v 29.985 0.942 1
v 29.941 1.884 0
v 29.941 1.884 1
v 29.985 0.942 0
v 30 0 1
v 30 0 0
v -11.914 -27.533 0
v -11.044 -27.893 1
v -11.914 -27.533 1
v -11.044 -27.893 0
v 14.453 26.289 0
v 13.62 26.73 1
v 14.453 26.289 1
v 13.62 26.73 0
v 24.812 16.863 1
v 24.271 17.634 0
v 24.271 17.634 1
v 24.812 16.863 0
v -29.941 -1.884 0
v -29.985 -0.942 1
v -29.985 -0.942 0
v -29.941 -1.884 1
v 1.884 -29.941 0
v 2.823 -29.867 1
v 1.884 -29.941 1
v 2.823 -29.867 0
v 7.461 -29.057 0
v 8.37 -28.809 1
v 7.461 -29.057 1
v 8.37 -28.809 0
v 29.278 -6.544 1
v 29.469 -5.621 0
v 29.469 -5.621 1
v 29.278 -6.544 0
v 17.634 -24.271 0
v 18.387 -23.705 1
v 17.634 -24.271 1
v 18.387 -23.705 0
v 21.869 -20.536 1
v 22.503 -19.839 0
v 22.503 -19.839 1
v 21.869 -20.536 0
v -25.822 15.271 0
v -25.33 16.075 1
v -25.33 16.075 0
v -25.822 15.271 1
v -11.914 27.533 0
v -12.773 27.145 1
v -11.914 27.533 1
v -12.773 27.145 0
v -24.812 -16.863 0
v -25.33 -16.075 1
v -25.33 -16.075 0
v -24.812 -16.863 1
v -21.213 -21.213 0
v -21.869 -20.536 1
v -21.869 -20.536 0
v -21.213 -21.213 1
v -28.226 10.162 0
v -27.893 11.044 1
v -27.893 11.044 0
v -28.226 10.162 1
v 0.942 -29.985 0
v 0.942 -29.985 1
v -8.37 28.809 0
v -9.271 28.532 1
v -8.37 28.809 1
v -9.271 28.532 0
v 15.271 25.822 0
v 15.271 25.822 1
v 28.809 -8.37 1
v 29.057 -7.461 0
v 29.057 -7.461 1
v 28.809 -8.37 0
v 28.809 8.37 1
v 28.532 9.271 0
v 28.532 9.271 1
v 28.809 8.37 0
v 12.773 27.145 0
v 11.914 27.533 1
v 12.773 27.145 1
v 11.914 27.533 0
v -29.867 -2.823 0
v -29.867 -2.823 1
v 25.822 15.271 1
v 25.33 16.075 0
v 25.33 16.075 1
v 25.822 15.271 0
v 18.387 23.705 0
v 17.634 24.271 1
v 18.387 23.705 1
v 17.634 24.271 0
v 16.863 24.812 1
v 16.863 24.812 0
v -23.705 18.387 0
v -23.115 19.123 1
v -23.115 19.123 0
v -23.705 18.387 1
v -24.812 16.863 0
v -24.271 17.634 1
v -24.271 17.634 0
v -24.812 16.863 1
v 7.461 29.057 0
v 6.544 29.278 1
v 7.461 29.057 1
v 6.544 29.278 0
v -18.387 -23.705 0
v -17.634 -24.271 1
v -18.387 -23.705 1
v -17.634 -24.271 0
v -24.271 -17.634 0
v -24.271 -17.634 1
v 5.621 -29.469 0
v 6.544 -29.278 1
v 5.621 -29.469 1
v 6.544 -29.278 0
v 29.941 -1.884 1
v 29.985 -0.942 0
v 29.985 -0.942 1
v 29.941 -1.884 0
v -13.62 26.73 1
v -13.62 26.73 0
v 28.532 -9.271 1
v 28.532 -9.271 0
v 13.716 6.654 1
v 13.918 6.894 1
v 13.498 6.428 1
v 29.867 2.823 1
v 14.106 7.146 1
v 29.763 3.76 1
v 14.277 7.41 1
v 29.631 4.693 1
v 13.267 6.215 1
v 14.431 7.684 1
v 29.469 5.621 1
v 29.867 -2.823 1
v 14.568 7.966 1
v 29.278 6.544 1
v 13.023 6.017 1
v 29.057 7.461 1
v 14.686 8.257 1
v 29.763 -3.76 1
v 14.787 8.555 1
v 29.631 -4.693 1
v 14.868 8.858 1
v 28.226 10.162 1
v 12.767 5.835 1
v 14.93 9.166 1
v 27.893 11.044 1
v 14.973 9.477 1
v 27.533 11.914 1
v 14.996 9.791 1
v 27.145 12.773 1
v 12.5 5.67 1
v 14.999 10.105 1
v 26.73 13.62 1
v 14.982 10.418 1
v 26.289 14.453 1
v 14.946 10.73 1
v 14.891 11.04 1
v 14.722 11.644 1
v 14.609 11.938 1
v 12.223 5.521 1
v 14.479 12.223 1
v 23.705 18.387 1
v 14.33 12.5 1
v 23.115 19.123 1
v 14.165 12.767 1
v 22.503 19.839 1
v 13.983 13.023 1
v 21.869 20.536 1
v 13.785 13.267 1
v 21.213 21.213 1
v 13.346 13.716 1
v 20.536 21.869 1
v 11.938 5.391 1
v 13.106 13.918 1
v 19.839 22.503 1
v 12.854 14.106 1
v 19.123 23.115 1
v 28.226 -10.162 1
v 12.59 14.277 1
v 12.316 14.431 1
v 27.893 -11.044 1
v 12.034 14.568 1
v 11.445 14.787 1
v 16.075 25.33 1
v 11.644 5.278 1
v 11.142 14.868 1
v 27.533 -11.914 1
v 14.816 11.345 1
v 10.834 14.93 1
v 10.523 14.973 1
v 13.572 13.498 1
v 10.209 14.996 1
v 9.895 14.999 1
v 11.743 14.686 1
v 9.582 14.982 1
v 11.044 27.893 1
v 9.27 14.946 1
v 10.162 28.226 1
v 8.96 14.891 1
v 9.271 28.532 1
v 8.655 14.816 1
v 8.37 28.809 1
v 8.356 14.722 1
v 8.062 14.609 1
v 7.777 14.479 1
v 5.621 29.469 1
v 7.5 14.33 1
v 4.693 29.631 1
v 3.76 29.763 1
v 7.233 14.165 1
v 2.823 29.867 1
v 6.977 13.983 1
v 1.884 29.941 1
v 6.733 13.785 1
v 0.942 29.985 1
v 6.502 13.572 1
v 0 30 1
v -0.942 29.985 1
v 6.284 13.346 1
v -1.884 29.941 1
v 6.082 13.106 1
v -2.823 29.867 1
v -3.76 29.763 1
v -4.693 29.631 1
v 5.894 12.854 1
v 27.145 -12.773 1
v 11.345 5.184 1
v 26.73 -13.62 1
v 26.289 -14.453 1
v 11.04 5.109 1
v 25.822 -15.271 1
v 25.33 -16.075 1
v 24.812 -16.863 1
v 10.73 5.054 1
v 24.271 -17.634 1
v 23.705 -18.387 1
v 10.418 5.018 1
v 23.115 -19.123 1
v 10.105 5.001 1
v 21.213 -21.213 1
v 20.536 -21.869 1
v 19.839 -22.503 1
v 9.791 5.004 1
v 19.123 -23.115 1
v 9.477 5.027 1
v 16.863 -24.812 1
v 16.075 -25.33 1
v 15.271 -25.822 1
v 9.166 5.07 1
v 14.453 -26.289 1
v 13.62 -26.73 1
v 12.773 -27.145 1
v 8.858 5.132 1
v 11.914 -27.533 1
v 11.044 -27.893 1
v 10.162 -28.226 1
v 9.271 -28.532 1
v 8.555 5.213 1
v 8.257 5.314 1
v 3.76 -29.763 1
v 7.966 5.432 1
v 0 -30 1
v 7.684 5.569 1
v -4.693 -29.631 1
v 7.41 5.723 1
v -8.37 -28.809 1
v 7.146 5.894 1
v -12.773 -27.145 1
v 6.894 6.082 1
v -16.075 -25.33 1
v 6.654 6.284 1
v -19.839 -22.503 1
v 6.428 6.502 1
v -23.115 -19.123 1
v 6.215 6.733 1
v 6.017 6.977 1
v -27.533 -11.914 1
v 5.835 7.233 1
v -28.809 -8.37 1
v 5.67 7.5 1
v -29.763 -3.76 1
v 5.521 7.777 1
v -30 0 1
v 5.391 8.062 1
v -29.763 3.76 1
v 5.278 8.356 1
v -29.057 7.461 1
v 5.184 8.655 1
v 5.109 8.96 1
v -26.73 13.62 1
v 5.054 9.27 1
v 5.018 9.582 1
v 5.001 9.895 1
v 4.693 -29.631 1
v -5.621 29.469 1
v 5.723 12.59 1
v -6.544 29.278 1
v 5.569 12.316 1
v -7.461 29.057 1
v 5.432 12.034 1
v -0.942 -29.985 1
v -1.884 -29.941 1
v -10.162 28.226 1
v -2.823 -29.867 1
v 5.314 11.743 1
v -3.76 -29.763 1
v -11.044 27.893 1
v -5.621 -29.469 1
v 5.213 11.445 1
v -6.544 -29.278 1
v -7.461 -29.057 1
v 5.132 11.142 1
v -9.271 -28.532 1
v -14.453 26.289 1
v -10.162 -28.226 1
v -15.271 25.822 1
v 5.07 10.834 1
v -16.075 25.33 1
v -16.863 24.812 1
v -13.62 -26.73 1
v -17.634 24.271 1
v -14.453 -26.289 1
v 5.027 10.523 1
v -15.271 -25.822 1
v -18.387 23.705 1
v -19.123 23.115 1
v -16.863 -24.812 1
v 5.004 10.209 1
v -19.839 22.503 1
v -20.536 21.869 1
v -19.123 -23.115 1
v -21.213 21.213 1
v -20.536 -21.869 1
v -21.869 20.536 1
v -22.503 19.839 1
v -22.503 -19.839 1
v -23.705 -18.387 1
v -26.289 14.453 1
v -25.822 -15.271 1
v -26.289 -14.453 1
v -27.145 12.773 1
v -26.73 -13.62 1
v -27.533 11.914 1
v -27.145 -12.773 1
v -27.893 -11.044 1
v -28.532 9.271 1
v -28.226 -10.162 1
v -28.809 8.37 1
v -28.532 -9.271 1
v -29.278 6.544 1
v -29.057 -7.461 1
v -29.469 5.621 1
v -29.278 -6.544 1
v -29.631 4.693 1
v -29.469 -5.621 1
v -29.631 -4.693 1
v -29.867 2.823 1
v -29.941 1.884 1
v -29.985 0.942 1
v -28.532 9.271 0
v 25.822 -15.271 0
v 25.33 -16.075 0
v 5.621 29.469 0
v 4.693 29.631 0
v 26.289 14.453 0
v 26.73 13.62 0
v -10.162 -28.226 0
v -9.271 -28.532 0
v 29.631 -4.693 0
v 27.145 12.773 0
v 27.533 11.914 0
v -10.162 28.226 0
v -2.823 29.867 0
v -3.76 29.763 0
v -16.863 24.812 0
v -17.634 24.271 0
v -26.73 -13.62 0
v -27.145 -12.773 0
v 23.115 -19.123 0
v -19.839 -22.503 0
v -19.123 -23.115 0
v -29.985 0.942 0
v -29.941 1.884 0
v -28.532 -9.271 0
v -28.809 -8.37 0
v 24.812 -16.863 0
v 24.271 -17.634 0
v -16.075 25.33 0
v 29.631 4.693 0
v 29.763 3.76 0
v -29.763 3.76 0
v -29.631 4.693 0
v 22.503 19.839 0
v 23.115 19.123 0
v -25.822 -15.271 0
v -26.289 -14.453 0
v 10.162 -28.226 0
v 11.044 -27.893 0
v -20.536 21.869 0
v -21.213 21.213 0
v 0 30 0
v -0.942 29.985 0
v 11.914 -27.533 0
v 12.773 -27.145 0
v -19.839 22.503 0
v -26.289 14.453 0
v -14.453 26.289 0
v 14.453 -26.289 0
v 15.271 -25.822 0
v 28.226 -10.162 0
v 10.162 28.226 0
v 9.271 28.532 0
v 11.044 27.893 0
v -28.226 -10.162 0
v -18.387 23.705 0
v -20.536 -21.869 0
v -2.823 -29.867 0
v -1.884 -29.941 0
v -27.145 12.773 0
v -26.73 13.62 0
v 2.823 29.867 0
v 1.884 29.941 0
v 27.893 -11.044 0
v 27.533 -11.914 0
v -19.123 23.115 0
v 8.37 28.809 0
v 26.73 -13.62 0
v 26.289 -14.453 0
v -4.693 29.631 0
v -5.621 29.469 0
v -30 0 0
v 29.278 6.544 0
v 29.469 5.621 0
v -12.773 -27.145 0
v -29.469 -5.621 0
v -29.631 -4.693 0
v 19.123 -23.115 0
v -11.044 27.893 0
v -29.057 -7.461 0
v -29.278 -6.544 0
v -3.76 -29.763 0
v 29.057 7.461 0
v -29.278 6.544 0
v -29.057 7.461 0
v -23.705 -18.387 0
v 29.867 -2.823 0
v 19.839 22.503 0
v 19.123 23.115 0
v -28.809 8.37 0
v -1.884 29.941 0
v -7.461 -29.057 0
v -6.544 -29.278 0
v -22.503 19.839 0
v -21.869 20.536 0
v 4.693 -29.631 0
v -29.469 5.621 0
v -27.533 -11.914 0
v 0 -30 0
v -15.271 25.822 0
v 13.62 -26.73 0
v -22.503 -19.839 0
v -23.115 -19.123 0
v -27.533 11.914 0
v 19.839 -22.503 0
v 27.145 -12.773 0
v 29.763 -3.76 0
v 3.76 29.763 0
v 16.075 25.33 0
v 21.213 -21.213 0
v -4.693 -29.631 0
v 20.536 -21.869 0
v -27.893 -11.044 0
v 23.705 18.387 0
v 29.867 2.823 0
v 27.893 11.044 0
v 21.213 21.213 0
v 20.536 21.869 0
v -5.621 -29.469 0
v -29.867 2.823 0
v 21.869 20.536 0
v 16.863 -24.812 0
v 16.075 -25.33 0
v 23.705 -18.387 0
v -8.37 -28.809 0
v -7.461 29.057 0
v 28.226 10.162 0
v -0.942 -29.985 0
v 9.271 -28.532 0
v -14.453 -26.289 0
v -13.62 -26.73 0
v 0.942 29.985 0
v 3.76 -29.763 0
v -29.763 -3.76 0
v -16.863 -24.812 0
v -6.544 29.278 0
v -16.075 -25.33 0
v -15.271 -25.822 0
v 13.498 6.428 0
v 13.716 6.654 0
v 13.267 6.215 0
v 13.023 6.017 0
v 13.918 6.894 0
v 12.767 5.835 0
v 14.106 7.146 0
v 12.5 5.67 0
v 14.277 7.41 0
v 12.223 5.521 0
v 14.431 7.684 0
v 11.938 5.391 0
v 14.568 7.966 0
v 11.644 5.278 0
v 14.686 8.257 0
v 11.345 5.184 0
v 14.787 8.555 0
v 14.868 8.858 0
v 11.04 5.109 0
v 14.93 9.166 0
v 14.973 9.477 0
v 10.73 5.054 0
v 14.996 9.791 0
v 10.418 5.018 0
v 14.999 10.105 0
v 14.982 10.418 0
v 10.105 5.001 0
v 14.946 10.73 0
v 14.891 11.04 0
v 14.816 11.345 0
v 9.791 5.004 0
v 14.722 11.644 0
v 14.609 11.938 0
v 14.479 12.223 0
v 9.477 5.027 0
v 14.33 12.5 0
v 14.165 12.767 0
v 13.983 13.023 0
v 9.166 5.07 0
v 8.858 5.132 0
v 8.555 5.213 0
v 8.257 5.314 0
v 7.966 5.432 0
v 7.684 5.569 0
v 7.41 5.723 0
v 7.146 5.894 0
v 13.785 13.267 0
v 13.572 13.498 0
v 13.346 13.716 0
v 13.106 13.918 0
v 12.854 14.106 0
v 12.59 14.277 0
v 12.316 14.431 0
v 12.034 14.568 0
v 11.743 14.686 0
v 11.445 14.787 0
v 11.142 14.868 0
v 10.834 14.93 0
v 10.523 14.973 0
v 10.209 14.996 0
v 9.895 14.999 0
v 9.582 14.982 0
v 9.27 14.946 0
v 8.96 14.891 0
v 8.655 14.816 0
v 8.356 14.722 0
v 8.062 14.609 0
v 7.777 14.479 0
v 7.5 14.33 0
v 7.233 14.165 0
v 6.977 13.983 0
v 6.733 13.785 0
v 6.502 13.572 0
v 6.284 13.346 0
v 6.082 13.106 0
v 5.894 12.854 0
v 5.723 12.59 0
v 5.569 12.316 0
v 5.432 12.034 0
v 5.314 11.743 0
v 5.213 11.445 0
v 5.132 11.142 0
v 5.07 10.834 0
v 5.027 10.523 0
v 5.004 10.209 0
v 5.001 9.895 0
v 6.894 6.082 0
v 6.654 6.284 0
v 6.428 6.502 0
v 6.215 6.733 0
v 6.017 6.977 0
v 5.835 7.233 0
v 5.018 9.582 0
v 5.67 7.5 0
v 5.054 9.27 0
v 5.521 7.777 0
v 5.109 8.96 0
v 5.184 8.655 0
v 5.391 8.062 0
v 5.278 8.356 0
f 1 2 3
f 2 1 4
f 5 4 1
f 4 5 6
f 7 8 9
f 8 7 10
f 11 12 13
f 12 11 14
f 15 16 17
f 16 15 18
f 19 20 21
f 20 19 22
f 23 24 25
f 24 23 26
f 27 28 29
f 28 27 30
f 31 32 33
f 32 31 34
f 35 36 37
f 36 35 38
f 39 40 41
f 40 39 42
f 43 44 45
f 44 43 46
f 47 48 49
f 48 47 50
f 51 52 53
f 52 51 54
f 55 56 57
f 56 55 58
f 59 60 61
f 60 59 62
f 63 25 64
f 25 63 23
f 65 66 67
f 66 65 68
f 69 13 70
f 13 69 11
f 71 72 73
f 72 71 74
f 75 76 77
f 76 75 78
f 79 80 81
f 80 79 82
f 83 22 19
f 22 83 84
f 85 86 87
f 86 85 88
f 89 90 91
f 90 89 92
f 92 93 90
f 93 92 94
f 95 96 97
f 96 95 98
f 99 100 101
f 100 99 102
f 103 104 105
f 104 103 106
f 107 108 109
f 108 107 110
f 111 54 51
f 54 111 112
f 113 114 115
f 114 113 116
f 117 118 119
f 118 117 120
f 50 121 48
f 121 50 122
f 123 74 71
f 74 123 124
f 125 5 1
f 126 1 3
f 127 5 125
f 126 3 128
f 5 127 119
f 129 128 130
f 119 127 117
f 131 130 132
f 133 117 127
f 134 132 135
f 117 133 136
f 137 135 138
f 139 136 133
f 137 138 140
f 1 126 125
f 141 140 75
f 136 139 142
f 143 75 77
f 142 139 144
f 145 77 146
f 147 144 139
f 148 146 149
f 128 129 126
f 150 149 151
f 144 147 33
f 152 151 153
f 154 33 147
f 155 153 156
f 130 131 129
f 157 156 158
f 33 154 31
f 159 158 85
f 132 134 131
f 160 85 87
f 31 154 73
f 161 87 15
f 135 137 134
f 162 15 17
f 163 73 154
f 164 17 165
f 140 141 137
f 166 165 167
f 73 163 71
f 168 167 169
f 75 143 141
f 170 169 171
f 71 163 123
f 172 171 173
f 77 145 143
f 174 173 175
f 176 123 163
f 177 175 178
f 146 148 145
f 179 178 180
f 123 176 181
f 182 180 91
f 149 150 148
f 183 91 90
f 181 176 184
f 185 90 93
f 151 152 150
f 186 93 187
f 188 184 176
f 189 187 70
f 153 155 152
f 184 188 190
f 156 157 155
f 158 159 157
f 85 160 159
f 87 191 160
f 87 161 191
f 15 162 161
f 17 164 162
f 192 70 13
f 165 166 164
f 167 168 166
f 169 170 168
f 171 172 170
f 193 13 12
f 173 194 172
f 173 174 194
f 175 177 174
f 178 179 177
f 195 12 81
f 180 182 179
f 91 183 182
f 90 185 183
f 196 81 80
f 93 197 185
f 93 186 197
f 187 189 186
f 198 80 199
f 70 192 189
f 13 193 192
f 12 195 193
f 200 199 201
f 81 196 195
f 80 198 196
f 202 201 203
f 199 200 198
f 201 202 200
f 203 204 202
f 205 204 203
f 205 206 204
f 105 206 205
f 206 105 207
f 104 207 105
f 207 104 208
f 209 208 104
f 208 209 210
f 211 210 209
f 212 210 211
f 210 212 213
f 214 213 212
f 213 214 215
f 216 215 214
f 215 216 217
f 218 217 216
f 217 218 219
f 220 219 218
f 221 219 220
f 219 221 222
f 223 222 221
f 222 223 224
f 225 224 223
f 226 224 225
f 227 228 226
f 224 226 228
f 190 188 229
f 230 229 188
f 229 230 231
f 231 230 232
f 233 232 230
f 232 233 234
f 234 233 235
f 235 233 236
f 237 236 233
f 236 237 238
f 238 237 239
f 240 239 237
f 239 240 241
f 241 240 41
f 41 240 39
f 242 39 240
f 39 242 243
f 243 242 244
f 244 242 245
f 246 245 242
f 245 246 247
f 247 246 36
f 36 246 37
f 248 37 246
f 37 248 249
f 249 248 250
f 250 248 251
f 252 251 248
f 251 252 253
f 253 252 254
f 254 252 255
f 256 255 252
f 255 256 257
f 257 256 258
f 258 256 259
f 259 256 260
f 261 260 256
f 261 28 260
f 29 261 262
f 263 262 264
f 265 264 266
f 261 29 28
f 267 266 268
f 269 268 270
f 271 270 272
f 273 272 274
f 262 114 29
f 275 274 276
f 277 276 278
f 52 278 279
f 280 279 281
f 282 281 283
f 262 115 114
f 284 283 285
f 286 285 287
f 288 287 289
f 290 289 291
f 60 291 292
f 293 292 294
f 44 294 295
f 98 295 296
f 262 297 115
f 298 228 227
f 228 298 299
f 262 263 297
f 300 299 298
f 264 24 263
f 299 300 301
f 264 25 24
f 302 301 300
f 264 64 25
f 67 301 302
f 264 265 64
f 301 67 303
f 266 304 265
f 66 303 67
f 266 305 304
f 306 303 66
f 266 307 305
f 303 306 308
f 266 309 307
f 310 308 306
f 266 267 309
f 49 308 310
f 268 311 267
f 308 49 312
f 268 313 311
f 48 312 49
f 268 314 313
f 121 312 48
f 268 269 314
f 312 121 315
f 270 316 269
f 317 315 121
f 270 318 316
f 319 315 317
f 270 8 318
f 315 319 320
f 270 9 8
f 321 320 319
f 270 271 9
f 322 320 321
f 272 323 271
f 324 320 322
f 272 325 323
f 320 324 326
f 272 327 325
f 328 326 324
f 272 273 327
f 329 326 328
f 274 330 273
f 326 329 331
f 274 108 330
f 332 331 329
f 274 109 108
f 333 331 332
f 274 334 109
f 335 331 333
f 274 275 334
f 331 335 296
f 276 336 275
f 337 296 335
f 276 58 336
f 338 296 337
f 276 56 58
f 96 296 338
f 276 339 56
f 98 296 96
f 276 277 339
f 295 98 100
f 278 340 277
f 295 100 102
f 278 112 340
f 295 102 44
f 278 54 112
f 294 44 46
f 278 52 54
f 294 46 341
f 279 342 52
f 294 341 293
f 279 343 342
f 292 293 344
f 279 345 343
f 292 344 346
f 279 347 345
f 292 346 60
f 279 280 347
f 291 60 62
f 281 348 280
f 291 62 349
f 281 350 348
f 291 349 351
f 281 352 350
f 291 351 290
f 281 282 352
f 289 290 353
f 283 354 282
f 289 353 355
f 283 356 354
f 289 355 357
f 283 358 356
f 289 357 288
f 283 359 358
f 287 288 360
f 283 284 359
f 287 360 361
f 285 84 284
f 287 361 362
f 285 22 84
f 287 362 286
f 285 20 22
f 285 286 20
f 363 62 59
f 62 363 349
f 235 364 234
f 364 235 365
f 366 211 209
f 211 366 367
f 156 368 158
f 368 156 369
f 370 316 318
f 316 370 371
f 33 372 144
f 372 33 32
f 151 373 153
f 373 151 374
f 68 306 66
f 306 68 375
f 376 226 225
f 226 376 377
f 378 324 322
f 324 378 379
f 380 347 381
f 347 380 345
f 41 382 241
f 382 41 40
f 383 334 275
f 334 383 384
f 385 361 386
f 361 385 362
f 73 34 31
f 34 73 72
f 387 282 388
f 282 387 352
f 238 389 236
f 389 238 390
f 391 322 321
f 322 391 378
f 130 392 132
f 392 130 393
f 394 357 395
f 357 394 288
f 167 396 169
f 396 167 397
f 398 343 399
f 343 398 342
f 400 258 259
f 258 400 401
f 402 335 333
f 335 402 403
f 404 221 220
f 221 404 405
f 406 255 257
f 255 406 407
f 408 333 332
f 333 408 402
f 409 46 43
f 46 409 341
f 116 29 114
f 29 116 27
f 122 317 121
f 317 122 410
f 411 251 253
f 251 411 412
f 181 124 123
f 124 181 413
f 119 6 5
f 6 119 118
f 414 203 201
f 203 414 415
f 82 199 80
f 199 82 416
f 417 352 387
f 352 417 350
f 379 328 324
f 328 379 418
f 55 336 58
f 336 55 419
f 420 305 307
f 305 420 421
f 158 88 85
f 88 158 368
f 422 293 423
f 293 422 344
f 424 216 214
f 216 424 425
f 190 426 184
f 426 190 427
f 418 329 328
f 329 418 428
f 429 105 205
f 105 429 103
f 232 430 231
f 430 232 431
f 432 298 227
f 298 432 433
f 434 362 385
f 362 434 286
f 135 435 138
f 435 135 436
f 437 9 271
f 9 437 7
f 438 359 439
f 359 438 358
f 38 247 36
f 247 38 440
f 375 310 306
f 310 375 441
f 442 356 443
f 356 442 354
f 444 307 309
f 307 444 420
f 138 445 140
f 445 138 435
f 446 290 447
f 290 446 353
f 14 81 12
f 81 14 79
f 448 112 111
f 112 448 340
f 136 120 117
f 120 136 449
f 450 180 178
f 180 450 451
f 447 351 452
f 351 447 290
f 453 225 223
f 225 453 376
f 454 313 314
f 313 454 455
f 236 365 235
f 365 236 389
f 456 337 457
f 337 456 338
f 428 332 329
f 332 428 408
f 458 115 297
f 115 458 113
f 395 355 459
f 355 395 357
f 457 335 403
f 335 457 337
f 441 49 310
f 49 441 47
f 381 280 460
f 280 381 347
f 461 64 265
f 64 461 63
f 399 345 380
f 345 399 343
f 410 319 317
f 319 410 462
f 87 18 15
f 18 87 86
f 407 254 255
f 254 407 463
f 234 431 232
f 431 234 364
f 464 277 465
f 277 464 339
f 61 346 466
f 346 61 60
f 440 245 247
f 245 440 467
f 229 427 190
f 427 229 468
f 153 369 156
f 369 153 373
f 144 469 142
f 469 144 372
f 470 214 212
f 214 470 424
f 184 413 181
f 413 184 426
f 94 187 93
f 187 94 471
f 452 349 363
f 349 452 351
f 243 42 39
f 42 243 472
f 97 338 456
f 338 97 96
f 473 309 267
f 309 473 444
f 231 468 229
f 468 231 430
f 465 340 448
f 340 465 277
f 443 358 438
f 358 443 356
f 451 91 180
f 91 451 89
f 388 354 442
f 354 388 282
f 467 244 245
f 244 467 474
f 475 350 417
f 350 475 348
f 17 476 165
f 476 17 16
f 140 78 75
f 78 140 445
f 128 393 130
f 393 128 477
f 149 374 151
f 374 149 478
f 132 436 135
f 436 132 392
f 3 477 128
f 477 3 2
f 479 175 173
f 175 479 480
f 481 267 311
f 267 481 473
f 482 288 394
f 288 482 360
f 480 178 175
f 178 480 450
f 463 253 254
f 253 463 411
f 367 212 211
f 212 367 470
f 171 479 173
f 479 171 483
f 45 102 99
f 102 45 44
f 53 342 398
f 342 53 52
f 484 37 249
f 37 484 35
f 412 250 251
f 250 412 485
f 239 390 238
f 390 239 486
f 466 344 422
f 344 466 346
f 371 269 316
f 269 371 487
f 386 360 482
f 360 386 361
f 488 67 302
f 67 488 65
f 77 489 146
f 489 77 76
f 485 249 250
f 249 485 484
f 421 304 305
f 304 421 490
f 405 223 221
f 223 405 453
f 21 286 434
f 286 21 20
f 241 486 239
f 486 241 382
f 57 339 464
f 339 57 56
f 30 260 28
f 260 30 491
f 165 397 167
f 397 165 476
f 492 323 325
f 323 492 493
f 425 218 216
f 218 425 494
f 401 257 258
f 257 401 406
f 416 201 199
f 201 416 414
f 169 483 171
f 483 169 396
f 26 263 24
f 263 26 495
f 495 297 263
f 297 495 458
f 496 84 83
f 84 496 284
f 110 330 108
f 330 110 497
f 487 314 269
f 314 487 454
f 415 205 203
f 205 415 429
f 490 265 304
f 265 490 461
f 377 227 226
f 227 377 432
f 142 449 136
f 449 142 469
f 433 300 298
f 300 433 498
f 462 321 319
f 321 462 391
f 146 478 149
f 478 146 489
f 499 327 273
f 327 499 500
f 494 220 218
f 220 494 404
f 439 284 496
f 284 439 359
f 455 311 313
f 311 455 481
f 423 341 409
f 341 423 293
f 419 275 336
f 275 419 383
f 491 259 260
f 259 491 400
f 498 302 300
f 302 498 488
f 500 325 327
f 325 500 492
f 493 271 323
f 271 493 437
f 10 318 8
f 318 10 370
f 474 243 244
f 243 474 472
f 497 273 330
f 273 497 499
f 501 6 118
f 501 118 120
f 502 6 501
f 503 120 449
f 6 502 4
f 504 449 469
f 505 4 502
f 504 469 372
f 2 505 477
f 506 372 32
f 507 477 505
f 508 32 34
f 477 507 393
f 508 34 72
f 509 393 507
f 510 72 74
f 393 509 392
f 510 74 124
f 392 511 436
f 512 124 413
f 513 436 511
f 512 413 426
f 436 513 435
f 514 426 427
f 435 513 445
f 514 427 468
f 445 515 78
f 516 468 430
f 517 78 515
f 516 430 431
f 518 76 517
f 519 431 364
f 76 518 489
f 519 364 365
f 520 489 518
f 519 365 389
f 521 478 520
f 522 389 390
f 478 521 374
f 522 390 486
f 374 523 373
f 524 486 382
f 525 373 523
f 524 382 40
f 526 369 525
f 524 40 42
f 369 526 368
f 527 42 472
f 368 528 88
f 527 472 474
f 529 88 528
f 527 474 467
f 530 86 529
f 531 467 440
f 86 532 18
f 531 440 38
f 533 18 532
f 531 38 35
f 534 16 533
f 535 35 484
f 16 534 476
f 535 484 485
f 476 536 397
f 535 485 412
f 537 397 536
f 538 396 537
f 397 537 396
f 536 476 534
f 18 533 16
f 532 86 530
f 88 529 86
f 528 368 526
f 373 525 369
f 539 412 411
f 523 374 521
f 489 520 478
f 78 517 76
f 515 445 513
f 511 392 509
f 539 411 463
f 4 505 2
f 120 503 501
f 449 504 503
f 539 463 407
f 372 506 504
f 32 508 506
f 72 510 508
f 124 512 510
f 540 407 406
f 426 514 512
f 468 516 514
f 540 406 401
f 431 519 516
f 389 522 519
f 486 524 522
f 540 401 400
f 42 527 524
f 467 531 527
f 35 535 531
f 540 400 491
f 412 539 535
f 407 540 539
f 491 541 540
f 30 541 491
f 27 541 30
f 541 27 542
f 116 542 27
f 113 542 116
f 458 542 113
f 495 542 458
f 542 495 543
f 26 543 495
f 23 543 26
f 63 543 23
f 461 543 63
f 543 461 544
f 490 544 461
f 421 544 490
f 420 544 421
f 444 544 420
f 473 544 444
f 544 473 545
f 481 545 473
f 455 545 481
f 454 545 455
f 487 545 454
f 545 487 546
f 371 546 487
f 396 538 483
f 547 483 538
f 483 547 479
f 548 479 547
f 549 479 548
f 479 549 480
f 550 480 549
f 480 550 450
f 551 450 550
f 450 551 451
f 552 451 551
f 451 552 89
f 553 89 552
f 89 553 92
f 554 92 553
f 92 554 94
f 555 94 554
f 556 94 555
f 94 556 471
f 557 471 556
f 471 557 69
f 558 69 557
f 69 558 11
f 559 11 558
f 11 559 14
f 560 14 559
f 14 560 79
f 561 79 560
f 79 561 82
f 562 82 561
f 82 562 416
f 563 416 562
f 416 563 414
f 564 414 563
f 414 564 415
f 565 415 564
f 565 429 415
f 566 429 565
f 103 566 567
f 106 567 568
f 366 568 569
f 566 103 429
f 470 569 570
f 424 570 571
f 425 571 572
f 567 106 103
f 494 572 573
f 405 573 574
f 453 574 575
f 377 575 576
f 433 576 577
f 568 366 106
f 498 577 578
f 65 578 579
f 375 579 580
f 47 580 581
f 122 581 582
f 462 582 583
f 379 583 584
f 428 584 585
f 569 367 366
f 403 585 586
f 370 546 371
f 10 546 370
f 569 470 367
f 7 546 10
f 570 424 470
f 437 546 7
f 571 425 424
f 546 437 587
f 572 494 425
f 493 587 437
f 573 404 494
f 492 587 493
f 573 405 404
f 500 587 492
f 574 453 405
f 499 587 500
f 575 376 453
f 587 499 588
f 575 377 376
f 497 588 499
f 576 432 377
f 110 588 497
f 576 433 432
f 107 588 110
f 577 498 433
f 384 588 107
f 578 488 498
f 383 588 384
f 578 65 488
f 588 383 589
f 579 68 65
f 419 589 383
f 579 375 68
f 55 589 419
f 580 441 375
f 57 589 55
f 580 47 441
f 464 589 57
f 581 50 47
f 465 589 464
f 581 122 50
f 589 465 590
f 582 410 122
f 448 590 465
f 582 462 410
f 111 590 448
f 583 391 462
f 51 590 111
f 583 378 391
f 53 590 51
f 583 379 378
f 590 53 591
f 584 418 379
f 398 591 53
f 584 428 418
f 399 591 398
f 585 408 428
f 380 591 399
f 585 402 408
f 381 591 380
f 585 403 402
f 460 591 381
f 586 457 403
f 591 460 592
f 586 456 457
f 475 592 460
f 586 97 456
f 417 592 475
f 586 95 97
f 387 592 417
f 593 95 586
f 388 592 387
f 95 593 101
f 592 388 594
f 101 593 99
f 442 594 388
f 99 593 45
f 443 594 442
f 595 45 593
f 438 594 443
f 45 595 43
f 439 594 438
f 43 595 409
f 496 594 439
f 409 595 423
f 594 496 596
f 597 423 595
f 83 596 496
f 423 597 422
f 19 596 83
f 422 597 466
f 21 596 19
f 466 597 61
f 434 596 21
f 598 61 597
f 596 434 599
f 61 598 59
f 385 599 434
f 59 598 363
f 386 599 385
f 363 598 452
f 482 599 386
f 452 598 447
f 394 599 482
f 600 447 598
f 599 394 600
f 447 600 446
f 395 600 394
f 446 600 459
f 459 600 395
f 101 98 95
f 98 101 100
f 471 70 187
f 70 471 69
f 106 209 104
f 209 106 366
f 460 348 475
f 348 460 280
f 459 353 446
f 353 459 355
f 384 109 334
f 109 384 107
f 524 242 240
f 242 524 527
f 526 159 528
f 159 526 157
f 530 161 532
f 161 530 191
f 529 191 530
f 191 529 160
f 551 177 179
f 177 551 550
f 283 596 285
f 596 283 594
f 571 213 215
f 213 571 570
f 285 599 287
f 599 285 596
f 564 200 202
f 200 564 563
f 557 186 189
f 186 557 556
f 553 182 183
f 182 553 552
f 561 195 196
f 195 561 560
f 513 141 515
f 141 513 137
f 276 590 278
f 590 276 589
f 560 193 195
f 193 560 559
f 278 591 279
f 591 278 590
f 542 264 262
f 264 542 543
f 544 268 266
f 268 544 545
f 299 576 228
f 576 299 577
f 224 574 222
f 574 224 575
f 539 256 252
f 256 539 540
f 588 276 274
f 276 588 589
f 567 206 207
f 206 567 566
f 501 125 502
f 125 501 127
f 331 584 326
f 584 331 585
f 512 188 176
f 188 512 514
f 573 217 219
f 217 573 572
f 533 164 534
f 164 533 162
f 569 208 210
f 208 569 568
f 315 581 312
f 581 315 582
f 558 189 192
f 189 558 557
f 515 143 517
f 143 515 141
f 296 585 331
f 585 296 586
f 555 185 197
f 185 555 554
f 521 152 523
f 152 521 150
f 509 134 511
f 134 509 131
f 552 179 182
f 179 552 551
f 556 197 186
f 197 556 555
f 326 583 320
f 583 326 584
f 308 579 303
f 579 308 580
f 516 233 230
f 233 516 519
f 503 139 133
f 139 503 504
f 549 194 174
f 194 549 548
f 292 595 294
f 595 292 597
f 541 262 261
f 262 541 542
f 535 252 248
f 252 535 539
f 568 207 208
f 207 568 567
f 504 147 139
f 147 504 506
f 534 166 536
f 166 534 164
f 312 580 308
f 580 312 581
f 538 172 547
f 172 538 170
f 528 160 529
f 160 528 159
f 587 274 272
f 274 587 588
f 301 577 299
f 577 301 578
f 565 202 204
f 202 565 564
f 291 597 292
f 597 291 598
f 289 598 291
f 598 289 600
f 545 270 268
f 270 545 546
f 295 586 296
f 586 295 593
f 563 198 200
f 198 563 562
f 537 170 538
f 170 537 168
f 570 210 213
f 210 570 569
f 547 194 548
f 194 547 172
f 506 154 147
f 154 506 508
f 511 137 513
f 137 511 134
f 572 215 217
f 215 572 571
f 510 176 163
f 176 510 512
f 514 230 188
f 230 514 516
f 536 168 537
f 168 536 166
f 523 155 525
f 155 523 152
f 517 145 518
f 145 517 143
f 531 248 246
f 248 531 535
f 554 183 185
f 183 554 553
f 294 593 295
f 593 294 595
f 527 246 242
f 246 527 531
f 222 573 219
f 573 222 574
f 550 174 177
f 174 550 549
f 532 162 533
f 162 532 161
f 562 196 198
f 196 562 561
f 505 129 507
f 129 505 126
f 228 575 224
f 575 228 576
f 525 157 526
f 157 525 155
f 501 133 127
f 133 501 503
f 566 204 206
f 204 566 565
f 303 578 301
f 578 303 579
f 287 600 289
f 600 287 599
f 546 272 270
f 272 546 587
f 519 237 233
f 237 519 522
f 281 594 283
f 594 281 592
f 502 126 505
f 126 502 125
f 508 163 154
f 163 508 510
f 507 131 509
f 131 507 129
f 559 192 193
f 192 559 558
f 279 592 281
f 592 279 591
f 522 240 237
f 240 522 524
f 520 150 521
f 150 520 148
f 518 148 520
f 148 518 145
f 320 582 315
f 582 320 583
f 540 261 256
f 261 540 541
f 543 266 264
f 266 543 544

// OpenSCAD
difference() {
   cylinder(r=30,h=1,$fn=200);
   translate([10,10,0])
      rotate(12)
         cylinder(r=5,h=1,$fn=100);
}
